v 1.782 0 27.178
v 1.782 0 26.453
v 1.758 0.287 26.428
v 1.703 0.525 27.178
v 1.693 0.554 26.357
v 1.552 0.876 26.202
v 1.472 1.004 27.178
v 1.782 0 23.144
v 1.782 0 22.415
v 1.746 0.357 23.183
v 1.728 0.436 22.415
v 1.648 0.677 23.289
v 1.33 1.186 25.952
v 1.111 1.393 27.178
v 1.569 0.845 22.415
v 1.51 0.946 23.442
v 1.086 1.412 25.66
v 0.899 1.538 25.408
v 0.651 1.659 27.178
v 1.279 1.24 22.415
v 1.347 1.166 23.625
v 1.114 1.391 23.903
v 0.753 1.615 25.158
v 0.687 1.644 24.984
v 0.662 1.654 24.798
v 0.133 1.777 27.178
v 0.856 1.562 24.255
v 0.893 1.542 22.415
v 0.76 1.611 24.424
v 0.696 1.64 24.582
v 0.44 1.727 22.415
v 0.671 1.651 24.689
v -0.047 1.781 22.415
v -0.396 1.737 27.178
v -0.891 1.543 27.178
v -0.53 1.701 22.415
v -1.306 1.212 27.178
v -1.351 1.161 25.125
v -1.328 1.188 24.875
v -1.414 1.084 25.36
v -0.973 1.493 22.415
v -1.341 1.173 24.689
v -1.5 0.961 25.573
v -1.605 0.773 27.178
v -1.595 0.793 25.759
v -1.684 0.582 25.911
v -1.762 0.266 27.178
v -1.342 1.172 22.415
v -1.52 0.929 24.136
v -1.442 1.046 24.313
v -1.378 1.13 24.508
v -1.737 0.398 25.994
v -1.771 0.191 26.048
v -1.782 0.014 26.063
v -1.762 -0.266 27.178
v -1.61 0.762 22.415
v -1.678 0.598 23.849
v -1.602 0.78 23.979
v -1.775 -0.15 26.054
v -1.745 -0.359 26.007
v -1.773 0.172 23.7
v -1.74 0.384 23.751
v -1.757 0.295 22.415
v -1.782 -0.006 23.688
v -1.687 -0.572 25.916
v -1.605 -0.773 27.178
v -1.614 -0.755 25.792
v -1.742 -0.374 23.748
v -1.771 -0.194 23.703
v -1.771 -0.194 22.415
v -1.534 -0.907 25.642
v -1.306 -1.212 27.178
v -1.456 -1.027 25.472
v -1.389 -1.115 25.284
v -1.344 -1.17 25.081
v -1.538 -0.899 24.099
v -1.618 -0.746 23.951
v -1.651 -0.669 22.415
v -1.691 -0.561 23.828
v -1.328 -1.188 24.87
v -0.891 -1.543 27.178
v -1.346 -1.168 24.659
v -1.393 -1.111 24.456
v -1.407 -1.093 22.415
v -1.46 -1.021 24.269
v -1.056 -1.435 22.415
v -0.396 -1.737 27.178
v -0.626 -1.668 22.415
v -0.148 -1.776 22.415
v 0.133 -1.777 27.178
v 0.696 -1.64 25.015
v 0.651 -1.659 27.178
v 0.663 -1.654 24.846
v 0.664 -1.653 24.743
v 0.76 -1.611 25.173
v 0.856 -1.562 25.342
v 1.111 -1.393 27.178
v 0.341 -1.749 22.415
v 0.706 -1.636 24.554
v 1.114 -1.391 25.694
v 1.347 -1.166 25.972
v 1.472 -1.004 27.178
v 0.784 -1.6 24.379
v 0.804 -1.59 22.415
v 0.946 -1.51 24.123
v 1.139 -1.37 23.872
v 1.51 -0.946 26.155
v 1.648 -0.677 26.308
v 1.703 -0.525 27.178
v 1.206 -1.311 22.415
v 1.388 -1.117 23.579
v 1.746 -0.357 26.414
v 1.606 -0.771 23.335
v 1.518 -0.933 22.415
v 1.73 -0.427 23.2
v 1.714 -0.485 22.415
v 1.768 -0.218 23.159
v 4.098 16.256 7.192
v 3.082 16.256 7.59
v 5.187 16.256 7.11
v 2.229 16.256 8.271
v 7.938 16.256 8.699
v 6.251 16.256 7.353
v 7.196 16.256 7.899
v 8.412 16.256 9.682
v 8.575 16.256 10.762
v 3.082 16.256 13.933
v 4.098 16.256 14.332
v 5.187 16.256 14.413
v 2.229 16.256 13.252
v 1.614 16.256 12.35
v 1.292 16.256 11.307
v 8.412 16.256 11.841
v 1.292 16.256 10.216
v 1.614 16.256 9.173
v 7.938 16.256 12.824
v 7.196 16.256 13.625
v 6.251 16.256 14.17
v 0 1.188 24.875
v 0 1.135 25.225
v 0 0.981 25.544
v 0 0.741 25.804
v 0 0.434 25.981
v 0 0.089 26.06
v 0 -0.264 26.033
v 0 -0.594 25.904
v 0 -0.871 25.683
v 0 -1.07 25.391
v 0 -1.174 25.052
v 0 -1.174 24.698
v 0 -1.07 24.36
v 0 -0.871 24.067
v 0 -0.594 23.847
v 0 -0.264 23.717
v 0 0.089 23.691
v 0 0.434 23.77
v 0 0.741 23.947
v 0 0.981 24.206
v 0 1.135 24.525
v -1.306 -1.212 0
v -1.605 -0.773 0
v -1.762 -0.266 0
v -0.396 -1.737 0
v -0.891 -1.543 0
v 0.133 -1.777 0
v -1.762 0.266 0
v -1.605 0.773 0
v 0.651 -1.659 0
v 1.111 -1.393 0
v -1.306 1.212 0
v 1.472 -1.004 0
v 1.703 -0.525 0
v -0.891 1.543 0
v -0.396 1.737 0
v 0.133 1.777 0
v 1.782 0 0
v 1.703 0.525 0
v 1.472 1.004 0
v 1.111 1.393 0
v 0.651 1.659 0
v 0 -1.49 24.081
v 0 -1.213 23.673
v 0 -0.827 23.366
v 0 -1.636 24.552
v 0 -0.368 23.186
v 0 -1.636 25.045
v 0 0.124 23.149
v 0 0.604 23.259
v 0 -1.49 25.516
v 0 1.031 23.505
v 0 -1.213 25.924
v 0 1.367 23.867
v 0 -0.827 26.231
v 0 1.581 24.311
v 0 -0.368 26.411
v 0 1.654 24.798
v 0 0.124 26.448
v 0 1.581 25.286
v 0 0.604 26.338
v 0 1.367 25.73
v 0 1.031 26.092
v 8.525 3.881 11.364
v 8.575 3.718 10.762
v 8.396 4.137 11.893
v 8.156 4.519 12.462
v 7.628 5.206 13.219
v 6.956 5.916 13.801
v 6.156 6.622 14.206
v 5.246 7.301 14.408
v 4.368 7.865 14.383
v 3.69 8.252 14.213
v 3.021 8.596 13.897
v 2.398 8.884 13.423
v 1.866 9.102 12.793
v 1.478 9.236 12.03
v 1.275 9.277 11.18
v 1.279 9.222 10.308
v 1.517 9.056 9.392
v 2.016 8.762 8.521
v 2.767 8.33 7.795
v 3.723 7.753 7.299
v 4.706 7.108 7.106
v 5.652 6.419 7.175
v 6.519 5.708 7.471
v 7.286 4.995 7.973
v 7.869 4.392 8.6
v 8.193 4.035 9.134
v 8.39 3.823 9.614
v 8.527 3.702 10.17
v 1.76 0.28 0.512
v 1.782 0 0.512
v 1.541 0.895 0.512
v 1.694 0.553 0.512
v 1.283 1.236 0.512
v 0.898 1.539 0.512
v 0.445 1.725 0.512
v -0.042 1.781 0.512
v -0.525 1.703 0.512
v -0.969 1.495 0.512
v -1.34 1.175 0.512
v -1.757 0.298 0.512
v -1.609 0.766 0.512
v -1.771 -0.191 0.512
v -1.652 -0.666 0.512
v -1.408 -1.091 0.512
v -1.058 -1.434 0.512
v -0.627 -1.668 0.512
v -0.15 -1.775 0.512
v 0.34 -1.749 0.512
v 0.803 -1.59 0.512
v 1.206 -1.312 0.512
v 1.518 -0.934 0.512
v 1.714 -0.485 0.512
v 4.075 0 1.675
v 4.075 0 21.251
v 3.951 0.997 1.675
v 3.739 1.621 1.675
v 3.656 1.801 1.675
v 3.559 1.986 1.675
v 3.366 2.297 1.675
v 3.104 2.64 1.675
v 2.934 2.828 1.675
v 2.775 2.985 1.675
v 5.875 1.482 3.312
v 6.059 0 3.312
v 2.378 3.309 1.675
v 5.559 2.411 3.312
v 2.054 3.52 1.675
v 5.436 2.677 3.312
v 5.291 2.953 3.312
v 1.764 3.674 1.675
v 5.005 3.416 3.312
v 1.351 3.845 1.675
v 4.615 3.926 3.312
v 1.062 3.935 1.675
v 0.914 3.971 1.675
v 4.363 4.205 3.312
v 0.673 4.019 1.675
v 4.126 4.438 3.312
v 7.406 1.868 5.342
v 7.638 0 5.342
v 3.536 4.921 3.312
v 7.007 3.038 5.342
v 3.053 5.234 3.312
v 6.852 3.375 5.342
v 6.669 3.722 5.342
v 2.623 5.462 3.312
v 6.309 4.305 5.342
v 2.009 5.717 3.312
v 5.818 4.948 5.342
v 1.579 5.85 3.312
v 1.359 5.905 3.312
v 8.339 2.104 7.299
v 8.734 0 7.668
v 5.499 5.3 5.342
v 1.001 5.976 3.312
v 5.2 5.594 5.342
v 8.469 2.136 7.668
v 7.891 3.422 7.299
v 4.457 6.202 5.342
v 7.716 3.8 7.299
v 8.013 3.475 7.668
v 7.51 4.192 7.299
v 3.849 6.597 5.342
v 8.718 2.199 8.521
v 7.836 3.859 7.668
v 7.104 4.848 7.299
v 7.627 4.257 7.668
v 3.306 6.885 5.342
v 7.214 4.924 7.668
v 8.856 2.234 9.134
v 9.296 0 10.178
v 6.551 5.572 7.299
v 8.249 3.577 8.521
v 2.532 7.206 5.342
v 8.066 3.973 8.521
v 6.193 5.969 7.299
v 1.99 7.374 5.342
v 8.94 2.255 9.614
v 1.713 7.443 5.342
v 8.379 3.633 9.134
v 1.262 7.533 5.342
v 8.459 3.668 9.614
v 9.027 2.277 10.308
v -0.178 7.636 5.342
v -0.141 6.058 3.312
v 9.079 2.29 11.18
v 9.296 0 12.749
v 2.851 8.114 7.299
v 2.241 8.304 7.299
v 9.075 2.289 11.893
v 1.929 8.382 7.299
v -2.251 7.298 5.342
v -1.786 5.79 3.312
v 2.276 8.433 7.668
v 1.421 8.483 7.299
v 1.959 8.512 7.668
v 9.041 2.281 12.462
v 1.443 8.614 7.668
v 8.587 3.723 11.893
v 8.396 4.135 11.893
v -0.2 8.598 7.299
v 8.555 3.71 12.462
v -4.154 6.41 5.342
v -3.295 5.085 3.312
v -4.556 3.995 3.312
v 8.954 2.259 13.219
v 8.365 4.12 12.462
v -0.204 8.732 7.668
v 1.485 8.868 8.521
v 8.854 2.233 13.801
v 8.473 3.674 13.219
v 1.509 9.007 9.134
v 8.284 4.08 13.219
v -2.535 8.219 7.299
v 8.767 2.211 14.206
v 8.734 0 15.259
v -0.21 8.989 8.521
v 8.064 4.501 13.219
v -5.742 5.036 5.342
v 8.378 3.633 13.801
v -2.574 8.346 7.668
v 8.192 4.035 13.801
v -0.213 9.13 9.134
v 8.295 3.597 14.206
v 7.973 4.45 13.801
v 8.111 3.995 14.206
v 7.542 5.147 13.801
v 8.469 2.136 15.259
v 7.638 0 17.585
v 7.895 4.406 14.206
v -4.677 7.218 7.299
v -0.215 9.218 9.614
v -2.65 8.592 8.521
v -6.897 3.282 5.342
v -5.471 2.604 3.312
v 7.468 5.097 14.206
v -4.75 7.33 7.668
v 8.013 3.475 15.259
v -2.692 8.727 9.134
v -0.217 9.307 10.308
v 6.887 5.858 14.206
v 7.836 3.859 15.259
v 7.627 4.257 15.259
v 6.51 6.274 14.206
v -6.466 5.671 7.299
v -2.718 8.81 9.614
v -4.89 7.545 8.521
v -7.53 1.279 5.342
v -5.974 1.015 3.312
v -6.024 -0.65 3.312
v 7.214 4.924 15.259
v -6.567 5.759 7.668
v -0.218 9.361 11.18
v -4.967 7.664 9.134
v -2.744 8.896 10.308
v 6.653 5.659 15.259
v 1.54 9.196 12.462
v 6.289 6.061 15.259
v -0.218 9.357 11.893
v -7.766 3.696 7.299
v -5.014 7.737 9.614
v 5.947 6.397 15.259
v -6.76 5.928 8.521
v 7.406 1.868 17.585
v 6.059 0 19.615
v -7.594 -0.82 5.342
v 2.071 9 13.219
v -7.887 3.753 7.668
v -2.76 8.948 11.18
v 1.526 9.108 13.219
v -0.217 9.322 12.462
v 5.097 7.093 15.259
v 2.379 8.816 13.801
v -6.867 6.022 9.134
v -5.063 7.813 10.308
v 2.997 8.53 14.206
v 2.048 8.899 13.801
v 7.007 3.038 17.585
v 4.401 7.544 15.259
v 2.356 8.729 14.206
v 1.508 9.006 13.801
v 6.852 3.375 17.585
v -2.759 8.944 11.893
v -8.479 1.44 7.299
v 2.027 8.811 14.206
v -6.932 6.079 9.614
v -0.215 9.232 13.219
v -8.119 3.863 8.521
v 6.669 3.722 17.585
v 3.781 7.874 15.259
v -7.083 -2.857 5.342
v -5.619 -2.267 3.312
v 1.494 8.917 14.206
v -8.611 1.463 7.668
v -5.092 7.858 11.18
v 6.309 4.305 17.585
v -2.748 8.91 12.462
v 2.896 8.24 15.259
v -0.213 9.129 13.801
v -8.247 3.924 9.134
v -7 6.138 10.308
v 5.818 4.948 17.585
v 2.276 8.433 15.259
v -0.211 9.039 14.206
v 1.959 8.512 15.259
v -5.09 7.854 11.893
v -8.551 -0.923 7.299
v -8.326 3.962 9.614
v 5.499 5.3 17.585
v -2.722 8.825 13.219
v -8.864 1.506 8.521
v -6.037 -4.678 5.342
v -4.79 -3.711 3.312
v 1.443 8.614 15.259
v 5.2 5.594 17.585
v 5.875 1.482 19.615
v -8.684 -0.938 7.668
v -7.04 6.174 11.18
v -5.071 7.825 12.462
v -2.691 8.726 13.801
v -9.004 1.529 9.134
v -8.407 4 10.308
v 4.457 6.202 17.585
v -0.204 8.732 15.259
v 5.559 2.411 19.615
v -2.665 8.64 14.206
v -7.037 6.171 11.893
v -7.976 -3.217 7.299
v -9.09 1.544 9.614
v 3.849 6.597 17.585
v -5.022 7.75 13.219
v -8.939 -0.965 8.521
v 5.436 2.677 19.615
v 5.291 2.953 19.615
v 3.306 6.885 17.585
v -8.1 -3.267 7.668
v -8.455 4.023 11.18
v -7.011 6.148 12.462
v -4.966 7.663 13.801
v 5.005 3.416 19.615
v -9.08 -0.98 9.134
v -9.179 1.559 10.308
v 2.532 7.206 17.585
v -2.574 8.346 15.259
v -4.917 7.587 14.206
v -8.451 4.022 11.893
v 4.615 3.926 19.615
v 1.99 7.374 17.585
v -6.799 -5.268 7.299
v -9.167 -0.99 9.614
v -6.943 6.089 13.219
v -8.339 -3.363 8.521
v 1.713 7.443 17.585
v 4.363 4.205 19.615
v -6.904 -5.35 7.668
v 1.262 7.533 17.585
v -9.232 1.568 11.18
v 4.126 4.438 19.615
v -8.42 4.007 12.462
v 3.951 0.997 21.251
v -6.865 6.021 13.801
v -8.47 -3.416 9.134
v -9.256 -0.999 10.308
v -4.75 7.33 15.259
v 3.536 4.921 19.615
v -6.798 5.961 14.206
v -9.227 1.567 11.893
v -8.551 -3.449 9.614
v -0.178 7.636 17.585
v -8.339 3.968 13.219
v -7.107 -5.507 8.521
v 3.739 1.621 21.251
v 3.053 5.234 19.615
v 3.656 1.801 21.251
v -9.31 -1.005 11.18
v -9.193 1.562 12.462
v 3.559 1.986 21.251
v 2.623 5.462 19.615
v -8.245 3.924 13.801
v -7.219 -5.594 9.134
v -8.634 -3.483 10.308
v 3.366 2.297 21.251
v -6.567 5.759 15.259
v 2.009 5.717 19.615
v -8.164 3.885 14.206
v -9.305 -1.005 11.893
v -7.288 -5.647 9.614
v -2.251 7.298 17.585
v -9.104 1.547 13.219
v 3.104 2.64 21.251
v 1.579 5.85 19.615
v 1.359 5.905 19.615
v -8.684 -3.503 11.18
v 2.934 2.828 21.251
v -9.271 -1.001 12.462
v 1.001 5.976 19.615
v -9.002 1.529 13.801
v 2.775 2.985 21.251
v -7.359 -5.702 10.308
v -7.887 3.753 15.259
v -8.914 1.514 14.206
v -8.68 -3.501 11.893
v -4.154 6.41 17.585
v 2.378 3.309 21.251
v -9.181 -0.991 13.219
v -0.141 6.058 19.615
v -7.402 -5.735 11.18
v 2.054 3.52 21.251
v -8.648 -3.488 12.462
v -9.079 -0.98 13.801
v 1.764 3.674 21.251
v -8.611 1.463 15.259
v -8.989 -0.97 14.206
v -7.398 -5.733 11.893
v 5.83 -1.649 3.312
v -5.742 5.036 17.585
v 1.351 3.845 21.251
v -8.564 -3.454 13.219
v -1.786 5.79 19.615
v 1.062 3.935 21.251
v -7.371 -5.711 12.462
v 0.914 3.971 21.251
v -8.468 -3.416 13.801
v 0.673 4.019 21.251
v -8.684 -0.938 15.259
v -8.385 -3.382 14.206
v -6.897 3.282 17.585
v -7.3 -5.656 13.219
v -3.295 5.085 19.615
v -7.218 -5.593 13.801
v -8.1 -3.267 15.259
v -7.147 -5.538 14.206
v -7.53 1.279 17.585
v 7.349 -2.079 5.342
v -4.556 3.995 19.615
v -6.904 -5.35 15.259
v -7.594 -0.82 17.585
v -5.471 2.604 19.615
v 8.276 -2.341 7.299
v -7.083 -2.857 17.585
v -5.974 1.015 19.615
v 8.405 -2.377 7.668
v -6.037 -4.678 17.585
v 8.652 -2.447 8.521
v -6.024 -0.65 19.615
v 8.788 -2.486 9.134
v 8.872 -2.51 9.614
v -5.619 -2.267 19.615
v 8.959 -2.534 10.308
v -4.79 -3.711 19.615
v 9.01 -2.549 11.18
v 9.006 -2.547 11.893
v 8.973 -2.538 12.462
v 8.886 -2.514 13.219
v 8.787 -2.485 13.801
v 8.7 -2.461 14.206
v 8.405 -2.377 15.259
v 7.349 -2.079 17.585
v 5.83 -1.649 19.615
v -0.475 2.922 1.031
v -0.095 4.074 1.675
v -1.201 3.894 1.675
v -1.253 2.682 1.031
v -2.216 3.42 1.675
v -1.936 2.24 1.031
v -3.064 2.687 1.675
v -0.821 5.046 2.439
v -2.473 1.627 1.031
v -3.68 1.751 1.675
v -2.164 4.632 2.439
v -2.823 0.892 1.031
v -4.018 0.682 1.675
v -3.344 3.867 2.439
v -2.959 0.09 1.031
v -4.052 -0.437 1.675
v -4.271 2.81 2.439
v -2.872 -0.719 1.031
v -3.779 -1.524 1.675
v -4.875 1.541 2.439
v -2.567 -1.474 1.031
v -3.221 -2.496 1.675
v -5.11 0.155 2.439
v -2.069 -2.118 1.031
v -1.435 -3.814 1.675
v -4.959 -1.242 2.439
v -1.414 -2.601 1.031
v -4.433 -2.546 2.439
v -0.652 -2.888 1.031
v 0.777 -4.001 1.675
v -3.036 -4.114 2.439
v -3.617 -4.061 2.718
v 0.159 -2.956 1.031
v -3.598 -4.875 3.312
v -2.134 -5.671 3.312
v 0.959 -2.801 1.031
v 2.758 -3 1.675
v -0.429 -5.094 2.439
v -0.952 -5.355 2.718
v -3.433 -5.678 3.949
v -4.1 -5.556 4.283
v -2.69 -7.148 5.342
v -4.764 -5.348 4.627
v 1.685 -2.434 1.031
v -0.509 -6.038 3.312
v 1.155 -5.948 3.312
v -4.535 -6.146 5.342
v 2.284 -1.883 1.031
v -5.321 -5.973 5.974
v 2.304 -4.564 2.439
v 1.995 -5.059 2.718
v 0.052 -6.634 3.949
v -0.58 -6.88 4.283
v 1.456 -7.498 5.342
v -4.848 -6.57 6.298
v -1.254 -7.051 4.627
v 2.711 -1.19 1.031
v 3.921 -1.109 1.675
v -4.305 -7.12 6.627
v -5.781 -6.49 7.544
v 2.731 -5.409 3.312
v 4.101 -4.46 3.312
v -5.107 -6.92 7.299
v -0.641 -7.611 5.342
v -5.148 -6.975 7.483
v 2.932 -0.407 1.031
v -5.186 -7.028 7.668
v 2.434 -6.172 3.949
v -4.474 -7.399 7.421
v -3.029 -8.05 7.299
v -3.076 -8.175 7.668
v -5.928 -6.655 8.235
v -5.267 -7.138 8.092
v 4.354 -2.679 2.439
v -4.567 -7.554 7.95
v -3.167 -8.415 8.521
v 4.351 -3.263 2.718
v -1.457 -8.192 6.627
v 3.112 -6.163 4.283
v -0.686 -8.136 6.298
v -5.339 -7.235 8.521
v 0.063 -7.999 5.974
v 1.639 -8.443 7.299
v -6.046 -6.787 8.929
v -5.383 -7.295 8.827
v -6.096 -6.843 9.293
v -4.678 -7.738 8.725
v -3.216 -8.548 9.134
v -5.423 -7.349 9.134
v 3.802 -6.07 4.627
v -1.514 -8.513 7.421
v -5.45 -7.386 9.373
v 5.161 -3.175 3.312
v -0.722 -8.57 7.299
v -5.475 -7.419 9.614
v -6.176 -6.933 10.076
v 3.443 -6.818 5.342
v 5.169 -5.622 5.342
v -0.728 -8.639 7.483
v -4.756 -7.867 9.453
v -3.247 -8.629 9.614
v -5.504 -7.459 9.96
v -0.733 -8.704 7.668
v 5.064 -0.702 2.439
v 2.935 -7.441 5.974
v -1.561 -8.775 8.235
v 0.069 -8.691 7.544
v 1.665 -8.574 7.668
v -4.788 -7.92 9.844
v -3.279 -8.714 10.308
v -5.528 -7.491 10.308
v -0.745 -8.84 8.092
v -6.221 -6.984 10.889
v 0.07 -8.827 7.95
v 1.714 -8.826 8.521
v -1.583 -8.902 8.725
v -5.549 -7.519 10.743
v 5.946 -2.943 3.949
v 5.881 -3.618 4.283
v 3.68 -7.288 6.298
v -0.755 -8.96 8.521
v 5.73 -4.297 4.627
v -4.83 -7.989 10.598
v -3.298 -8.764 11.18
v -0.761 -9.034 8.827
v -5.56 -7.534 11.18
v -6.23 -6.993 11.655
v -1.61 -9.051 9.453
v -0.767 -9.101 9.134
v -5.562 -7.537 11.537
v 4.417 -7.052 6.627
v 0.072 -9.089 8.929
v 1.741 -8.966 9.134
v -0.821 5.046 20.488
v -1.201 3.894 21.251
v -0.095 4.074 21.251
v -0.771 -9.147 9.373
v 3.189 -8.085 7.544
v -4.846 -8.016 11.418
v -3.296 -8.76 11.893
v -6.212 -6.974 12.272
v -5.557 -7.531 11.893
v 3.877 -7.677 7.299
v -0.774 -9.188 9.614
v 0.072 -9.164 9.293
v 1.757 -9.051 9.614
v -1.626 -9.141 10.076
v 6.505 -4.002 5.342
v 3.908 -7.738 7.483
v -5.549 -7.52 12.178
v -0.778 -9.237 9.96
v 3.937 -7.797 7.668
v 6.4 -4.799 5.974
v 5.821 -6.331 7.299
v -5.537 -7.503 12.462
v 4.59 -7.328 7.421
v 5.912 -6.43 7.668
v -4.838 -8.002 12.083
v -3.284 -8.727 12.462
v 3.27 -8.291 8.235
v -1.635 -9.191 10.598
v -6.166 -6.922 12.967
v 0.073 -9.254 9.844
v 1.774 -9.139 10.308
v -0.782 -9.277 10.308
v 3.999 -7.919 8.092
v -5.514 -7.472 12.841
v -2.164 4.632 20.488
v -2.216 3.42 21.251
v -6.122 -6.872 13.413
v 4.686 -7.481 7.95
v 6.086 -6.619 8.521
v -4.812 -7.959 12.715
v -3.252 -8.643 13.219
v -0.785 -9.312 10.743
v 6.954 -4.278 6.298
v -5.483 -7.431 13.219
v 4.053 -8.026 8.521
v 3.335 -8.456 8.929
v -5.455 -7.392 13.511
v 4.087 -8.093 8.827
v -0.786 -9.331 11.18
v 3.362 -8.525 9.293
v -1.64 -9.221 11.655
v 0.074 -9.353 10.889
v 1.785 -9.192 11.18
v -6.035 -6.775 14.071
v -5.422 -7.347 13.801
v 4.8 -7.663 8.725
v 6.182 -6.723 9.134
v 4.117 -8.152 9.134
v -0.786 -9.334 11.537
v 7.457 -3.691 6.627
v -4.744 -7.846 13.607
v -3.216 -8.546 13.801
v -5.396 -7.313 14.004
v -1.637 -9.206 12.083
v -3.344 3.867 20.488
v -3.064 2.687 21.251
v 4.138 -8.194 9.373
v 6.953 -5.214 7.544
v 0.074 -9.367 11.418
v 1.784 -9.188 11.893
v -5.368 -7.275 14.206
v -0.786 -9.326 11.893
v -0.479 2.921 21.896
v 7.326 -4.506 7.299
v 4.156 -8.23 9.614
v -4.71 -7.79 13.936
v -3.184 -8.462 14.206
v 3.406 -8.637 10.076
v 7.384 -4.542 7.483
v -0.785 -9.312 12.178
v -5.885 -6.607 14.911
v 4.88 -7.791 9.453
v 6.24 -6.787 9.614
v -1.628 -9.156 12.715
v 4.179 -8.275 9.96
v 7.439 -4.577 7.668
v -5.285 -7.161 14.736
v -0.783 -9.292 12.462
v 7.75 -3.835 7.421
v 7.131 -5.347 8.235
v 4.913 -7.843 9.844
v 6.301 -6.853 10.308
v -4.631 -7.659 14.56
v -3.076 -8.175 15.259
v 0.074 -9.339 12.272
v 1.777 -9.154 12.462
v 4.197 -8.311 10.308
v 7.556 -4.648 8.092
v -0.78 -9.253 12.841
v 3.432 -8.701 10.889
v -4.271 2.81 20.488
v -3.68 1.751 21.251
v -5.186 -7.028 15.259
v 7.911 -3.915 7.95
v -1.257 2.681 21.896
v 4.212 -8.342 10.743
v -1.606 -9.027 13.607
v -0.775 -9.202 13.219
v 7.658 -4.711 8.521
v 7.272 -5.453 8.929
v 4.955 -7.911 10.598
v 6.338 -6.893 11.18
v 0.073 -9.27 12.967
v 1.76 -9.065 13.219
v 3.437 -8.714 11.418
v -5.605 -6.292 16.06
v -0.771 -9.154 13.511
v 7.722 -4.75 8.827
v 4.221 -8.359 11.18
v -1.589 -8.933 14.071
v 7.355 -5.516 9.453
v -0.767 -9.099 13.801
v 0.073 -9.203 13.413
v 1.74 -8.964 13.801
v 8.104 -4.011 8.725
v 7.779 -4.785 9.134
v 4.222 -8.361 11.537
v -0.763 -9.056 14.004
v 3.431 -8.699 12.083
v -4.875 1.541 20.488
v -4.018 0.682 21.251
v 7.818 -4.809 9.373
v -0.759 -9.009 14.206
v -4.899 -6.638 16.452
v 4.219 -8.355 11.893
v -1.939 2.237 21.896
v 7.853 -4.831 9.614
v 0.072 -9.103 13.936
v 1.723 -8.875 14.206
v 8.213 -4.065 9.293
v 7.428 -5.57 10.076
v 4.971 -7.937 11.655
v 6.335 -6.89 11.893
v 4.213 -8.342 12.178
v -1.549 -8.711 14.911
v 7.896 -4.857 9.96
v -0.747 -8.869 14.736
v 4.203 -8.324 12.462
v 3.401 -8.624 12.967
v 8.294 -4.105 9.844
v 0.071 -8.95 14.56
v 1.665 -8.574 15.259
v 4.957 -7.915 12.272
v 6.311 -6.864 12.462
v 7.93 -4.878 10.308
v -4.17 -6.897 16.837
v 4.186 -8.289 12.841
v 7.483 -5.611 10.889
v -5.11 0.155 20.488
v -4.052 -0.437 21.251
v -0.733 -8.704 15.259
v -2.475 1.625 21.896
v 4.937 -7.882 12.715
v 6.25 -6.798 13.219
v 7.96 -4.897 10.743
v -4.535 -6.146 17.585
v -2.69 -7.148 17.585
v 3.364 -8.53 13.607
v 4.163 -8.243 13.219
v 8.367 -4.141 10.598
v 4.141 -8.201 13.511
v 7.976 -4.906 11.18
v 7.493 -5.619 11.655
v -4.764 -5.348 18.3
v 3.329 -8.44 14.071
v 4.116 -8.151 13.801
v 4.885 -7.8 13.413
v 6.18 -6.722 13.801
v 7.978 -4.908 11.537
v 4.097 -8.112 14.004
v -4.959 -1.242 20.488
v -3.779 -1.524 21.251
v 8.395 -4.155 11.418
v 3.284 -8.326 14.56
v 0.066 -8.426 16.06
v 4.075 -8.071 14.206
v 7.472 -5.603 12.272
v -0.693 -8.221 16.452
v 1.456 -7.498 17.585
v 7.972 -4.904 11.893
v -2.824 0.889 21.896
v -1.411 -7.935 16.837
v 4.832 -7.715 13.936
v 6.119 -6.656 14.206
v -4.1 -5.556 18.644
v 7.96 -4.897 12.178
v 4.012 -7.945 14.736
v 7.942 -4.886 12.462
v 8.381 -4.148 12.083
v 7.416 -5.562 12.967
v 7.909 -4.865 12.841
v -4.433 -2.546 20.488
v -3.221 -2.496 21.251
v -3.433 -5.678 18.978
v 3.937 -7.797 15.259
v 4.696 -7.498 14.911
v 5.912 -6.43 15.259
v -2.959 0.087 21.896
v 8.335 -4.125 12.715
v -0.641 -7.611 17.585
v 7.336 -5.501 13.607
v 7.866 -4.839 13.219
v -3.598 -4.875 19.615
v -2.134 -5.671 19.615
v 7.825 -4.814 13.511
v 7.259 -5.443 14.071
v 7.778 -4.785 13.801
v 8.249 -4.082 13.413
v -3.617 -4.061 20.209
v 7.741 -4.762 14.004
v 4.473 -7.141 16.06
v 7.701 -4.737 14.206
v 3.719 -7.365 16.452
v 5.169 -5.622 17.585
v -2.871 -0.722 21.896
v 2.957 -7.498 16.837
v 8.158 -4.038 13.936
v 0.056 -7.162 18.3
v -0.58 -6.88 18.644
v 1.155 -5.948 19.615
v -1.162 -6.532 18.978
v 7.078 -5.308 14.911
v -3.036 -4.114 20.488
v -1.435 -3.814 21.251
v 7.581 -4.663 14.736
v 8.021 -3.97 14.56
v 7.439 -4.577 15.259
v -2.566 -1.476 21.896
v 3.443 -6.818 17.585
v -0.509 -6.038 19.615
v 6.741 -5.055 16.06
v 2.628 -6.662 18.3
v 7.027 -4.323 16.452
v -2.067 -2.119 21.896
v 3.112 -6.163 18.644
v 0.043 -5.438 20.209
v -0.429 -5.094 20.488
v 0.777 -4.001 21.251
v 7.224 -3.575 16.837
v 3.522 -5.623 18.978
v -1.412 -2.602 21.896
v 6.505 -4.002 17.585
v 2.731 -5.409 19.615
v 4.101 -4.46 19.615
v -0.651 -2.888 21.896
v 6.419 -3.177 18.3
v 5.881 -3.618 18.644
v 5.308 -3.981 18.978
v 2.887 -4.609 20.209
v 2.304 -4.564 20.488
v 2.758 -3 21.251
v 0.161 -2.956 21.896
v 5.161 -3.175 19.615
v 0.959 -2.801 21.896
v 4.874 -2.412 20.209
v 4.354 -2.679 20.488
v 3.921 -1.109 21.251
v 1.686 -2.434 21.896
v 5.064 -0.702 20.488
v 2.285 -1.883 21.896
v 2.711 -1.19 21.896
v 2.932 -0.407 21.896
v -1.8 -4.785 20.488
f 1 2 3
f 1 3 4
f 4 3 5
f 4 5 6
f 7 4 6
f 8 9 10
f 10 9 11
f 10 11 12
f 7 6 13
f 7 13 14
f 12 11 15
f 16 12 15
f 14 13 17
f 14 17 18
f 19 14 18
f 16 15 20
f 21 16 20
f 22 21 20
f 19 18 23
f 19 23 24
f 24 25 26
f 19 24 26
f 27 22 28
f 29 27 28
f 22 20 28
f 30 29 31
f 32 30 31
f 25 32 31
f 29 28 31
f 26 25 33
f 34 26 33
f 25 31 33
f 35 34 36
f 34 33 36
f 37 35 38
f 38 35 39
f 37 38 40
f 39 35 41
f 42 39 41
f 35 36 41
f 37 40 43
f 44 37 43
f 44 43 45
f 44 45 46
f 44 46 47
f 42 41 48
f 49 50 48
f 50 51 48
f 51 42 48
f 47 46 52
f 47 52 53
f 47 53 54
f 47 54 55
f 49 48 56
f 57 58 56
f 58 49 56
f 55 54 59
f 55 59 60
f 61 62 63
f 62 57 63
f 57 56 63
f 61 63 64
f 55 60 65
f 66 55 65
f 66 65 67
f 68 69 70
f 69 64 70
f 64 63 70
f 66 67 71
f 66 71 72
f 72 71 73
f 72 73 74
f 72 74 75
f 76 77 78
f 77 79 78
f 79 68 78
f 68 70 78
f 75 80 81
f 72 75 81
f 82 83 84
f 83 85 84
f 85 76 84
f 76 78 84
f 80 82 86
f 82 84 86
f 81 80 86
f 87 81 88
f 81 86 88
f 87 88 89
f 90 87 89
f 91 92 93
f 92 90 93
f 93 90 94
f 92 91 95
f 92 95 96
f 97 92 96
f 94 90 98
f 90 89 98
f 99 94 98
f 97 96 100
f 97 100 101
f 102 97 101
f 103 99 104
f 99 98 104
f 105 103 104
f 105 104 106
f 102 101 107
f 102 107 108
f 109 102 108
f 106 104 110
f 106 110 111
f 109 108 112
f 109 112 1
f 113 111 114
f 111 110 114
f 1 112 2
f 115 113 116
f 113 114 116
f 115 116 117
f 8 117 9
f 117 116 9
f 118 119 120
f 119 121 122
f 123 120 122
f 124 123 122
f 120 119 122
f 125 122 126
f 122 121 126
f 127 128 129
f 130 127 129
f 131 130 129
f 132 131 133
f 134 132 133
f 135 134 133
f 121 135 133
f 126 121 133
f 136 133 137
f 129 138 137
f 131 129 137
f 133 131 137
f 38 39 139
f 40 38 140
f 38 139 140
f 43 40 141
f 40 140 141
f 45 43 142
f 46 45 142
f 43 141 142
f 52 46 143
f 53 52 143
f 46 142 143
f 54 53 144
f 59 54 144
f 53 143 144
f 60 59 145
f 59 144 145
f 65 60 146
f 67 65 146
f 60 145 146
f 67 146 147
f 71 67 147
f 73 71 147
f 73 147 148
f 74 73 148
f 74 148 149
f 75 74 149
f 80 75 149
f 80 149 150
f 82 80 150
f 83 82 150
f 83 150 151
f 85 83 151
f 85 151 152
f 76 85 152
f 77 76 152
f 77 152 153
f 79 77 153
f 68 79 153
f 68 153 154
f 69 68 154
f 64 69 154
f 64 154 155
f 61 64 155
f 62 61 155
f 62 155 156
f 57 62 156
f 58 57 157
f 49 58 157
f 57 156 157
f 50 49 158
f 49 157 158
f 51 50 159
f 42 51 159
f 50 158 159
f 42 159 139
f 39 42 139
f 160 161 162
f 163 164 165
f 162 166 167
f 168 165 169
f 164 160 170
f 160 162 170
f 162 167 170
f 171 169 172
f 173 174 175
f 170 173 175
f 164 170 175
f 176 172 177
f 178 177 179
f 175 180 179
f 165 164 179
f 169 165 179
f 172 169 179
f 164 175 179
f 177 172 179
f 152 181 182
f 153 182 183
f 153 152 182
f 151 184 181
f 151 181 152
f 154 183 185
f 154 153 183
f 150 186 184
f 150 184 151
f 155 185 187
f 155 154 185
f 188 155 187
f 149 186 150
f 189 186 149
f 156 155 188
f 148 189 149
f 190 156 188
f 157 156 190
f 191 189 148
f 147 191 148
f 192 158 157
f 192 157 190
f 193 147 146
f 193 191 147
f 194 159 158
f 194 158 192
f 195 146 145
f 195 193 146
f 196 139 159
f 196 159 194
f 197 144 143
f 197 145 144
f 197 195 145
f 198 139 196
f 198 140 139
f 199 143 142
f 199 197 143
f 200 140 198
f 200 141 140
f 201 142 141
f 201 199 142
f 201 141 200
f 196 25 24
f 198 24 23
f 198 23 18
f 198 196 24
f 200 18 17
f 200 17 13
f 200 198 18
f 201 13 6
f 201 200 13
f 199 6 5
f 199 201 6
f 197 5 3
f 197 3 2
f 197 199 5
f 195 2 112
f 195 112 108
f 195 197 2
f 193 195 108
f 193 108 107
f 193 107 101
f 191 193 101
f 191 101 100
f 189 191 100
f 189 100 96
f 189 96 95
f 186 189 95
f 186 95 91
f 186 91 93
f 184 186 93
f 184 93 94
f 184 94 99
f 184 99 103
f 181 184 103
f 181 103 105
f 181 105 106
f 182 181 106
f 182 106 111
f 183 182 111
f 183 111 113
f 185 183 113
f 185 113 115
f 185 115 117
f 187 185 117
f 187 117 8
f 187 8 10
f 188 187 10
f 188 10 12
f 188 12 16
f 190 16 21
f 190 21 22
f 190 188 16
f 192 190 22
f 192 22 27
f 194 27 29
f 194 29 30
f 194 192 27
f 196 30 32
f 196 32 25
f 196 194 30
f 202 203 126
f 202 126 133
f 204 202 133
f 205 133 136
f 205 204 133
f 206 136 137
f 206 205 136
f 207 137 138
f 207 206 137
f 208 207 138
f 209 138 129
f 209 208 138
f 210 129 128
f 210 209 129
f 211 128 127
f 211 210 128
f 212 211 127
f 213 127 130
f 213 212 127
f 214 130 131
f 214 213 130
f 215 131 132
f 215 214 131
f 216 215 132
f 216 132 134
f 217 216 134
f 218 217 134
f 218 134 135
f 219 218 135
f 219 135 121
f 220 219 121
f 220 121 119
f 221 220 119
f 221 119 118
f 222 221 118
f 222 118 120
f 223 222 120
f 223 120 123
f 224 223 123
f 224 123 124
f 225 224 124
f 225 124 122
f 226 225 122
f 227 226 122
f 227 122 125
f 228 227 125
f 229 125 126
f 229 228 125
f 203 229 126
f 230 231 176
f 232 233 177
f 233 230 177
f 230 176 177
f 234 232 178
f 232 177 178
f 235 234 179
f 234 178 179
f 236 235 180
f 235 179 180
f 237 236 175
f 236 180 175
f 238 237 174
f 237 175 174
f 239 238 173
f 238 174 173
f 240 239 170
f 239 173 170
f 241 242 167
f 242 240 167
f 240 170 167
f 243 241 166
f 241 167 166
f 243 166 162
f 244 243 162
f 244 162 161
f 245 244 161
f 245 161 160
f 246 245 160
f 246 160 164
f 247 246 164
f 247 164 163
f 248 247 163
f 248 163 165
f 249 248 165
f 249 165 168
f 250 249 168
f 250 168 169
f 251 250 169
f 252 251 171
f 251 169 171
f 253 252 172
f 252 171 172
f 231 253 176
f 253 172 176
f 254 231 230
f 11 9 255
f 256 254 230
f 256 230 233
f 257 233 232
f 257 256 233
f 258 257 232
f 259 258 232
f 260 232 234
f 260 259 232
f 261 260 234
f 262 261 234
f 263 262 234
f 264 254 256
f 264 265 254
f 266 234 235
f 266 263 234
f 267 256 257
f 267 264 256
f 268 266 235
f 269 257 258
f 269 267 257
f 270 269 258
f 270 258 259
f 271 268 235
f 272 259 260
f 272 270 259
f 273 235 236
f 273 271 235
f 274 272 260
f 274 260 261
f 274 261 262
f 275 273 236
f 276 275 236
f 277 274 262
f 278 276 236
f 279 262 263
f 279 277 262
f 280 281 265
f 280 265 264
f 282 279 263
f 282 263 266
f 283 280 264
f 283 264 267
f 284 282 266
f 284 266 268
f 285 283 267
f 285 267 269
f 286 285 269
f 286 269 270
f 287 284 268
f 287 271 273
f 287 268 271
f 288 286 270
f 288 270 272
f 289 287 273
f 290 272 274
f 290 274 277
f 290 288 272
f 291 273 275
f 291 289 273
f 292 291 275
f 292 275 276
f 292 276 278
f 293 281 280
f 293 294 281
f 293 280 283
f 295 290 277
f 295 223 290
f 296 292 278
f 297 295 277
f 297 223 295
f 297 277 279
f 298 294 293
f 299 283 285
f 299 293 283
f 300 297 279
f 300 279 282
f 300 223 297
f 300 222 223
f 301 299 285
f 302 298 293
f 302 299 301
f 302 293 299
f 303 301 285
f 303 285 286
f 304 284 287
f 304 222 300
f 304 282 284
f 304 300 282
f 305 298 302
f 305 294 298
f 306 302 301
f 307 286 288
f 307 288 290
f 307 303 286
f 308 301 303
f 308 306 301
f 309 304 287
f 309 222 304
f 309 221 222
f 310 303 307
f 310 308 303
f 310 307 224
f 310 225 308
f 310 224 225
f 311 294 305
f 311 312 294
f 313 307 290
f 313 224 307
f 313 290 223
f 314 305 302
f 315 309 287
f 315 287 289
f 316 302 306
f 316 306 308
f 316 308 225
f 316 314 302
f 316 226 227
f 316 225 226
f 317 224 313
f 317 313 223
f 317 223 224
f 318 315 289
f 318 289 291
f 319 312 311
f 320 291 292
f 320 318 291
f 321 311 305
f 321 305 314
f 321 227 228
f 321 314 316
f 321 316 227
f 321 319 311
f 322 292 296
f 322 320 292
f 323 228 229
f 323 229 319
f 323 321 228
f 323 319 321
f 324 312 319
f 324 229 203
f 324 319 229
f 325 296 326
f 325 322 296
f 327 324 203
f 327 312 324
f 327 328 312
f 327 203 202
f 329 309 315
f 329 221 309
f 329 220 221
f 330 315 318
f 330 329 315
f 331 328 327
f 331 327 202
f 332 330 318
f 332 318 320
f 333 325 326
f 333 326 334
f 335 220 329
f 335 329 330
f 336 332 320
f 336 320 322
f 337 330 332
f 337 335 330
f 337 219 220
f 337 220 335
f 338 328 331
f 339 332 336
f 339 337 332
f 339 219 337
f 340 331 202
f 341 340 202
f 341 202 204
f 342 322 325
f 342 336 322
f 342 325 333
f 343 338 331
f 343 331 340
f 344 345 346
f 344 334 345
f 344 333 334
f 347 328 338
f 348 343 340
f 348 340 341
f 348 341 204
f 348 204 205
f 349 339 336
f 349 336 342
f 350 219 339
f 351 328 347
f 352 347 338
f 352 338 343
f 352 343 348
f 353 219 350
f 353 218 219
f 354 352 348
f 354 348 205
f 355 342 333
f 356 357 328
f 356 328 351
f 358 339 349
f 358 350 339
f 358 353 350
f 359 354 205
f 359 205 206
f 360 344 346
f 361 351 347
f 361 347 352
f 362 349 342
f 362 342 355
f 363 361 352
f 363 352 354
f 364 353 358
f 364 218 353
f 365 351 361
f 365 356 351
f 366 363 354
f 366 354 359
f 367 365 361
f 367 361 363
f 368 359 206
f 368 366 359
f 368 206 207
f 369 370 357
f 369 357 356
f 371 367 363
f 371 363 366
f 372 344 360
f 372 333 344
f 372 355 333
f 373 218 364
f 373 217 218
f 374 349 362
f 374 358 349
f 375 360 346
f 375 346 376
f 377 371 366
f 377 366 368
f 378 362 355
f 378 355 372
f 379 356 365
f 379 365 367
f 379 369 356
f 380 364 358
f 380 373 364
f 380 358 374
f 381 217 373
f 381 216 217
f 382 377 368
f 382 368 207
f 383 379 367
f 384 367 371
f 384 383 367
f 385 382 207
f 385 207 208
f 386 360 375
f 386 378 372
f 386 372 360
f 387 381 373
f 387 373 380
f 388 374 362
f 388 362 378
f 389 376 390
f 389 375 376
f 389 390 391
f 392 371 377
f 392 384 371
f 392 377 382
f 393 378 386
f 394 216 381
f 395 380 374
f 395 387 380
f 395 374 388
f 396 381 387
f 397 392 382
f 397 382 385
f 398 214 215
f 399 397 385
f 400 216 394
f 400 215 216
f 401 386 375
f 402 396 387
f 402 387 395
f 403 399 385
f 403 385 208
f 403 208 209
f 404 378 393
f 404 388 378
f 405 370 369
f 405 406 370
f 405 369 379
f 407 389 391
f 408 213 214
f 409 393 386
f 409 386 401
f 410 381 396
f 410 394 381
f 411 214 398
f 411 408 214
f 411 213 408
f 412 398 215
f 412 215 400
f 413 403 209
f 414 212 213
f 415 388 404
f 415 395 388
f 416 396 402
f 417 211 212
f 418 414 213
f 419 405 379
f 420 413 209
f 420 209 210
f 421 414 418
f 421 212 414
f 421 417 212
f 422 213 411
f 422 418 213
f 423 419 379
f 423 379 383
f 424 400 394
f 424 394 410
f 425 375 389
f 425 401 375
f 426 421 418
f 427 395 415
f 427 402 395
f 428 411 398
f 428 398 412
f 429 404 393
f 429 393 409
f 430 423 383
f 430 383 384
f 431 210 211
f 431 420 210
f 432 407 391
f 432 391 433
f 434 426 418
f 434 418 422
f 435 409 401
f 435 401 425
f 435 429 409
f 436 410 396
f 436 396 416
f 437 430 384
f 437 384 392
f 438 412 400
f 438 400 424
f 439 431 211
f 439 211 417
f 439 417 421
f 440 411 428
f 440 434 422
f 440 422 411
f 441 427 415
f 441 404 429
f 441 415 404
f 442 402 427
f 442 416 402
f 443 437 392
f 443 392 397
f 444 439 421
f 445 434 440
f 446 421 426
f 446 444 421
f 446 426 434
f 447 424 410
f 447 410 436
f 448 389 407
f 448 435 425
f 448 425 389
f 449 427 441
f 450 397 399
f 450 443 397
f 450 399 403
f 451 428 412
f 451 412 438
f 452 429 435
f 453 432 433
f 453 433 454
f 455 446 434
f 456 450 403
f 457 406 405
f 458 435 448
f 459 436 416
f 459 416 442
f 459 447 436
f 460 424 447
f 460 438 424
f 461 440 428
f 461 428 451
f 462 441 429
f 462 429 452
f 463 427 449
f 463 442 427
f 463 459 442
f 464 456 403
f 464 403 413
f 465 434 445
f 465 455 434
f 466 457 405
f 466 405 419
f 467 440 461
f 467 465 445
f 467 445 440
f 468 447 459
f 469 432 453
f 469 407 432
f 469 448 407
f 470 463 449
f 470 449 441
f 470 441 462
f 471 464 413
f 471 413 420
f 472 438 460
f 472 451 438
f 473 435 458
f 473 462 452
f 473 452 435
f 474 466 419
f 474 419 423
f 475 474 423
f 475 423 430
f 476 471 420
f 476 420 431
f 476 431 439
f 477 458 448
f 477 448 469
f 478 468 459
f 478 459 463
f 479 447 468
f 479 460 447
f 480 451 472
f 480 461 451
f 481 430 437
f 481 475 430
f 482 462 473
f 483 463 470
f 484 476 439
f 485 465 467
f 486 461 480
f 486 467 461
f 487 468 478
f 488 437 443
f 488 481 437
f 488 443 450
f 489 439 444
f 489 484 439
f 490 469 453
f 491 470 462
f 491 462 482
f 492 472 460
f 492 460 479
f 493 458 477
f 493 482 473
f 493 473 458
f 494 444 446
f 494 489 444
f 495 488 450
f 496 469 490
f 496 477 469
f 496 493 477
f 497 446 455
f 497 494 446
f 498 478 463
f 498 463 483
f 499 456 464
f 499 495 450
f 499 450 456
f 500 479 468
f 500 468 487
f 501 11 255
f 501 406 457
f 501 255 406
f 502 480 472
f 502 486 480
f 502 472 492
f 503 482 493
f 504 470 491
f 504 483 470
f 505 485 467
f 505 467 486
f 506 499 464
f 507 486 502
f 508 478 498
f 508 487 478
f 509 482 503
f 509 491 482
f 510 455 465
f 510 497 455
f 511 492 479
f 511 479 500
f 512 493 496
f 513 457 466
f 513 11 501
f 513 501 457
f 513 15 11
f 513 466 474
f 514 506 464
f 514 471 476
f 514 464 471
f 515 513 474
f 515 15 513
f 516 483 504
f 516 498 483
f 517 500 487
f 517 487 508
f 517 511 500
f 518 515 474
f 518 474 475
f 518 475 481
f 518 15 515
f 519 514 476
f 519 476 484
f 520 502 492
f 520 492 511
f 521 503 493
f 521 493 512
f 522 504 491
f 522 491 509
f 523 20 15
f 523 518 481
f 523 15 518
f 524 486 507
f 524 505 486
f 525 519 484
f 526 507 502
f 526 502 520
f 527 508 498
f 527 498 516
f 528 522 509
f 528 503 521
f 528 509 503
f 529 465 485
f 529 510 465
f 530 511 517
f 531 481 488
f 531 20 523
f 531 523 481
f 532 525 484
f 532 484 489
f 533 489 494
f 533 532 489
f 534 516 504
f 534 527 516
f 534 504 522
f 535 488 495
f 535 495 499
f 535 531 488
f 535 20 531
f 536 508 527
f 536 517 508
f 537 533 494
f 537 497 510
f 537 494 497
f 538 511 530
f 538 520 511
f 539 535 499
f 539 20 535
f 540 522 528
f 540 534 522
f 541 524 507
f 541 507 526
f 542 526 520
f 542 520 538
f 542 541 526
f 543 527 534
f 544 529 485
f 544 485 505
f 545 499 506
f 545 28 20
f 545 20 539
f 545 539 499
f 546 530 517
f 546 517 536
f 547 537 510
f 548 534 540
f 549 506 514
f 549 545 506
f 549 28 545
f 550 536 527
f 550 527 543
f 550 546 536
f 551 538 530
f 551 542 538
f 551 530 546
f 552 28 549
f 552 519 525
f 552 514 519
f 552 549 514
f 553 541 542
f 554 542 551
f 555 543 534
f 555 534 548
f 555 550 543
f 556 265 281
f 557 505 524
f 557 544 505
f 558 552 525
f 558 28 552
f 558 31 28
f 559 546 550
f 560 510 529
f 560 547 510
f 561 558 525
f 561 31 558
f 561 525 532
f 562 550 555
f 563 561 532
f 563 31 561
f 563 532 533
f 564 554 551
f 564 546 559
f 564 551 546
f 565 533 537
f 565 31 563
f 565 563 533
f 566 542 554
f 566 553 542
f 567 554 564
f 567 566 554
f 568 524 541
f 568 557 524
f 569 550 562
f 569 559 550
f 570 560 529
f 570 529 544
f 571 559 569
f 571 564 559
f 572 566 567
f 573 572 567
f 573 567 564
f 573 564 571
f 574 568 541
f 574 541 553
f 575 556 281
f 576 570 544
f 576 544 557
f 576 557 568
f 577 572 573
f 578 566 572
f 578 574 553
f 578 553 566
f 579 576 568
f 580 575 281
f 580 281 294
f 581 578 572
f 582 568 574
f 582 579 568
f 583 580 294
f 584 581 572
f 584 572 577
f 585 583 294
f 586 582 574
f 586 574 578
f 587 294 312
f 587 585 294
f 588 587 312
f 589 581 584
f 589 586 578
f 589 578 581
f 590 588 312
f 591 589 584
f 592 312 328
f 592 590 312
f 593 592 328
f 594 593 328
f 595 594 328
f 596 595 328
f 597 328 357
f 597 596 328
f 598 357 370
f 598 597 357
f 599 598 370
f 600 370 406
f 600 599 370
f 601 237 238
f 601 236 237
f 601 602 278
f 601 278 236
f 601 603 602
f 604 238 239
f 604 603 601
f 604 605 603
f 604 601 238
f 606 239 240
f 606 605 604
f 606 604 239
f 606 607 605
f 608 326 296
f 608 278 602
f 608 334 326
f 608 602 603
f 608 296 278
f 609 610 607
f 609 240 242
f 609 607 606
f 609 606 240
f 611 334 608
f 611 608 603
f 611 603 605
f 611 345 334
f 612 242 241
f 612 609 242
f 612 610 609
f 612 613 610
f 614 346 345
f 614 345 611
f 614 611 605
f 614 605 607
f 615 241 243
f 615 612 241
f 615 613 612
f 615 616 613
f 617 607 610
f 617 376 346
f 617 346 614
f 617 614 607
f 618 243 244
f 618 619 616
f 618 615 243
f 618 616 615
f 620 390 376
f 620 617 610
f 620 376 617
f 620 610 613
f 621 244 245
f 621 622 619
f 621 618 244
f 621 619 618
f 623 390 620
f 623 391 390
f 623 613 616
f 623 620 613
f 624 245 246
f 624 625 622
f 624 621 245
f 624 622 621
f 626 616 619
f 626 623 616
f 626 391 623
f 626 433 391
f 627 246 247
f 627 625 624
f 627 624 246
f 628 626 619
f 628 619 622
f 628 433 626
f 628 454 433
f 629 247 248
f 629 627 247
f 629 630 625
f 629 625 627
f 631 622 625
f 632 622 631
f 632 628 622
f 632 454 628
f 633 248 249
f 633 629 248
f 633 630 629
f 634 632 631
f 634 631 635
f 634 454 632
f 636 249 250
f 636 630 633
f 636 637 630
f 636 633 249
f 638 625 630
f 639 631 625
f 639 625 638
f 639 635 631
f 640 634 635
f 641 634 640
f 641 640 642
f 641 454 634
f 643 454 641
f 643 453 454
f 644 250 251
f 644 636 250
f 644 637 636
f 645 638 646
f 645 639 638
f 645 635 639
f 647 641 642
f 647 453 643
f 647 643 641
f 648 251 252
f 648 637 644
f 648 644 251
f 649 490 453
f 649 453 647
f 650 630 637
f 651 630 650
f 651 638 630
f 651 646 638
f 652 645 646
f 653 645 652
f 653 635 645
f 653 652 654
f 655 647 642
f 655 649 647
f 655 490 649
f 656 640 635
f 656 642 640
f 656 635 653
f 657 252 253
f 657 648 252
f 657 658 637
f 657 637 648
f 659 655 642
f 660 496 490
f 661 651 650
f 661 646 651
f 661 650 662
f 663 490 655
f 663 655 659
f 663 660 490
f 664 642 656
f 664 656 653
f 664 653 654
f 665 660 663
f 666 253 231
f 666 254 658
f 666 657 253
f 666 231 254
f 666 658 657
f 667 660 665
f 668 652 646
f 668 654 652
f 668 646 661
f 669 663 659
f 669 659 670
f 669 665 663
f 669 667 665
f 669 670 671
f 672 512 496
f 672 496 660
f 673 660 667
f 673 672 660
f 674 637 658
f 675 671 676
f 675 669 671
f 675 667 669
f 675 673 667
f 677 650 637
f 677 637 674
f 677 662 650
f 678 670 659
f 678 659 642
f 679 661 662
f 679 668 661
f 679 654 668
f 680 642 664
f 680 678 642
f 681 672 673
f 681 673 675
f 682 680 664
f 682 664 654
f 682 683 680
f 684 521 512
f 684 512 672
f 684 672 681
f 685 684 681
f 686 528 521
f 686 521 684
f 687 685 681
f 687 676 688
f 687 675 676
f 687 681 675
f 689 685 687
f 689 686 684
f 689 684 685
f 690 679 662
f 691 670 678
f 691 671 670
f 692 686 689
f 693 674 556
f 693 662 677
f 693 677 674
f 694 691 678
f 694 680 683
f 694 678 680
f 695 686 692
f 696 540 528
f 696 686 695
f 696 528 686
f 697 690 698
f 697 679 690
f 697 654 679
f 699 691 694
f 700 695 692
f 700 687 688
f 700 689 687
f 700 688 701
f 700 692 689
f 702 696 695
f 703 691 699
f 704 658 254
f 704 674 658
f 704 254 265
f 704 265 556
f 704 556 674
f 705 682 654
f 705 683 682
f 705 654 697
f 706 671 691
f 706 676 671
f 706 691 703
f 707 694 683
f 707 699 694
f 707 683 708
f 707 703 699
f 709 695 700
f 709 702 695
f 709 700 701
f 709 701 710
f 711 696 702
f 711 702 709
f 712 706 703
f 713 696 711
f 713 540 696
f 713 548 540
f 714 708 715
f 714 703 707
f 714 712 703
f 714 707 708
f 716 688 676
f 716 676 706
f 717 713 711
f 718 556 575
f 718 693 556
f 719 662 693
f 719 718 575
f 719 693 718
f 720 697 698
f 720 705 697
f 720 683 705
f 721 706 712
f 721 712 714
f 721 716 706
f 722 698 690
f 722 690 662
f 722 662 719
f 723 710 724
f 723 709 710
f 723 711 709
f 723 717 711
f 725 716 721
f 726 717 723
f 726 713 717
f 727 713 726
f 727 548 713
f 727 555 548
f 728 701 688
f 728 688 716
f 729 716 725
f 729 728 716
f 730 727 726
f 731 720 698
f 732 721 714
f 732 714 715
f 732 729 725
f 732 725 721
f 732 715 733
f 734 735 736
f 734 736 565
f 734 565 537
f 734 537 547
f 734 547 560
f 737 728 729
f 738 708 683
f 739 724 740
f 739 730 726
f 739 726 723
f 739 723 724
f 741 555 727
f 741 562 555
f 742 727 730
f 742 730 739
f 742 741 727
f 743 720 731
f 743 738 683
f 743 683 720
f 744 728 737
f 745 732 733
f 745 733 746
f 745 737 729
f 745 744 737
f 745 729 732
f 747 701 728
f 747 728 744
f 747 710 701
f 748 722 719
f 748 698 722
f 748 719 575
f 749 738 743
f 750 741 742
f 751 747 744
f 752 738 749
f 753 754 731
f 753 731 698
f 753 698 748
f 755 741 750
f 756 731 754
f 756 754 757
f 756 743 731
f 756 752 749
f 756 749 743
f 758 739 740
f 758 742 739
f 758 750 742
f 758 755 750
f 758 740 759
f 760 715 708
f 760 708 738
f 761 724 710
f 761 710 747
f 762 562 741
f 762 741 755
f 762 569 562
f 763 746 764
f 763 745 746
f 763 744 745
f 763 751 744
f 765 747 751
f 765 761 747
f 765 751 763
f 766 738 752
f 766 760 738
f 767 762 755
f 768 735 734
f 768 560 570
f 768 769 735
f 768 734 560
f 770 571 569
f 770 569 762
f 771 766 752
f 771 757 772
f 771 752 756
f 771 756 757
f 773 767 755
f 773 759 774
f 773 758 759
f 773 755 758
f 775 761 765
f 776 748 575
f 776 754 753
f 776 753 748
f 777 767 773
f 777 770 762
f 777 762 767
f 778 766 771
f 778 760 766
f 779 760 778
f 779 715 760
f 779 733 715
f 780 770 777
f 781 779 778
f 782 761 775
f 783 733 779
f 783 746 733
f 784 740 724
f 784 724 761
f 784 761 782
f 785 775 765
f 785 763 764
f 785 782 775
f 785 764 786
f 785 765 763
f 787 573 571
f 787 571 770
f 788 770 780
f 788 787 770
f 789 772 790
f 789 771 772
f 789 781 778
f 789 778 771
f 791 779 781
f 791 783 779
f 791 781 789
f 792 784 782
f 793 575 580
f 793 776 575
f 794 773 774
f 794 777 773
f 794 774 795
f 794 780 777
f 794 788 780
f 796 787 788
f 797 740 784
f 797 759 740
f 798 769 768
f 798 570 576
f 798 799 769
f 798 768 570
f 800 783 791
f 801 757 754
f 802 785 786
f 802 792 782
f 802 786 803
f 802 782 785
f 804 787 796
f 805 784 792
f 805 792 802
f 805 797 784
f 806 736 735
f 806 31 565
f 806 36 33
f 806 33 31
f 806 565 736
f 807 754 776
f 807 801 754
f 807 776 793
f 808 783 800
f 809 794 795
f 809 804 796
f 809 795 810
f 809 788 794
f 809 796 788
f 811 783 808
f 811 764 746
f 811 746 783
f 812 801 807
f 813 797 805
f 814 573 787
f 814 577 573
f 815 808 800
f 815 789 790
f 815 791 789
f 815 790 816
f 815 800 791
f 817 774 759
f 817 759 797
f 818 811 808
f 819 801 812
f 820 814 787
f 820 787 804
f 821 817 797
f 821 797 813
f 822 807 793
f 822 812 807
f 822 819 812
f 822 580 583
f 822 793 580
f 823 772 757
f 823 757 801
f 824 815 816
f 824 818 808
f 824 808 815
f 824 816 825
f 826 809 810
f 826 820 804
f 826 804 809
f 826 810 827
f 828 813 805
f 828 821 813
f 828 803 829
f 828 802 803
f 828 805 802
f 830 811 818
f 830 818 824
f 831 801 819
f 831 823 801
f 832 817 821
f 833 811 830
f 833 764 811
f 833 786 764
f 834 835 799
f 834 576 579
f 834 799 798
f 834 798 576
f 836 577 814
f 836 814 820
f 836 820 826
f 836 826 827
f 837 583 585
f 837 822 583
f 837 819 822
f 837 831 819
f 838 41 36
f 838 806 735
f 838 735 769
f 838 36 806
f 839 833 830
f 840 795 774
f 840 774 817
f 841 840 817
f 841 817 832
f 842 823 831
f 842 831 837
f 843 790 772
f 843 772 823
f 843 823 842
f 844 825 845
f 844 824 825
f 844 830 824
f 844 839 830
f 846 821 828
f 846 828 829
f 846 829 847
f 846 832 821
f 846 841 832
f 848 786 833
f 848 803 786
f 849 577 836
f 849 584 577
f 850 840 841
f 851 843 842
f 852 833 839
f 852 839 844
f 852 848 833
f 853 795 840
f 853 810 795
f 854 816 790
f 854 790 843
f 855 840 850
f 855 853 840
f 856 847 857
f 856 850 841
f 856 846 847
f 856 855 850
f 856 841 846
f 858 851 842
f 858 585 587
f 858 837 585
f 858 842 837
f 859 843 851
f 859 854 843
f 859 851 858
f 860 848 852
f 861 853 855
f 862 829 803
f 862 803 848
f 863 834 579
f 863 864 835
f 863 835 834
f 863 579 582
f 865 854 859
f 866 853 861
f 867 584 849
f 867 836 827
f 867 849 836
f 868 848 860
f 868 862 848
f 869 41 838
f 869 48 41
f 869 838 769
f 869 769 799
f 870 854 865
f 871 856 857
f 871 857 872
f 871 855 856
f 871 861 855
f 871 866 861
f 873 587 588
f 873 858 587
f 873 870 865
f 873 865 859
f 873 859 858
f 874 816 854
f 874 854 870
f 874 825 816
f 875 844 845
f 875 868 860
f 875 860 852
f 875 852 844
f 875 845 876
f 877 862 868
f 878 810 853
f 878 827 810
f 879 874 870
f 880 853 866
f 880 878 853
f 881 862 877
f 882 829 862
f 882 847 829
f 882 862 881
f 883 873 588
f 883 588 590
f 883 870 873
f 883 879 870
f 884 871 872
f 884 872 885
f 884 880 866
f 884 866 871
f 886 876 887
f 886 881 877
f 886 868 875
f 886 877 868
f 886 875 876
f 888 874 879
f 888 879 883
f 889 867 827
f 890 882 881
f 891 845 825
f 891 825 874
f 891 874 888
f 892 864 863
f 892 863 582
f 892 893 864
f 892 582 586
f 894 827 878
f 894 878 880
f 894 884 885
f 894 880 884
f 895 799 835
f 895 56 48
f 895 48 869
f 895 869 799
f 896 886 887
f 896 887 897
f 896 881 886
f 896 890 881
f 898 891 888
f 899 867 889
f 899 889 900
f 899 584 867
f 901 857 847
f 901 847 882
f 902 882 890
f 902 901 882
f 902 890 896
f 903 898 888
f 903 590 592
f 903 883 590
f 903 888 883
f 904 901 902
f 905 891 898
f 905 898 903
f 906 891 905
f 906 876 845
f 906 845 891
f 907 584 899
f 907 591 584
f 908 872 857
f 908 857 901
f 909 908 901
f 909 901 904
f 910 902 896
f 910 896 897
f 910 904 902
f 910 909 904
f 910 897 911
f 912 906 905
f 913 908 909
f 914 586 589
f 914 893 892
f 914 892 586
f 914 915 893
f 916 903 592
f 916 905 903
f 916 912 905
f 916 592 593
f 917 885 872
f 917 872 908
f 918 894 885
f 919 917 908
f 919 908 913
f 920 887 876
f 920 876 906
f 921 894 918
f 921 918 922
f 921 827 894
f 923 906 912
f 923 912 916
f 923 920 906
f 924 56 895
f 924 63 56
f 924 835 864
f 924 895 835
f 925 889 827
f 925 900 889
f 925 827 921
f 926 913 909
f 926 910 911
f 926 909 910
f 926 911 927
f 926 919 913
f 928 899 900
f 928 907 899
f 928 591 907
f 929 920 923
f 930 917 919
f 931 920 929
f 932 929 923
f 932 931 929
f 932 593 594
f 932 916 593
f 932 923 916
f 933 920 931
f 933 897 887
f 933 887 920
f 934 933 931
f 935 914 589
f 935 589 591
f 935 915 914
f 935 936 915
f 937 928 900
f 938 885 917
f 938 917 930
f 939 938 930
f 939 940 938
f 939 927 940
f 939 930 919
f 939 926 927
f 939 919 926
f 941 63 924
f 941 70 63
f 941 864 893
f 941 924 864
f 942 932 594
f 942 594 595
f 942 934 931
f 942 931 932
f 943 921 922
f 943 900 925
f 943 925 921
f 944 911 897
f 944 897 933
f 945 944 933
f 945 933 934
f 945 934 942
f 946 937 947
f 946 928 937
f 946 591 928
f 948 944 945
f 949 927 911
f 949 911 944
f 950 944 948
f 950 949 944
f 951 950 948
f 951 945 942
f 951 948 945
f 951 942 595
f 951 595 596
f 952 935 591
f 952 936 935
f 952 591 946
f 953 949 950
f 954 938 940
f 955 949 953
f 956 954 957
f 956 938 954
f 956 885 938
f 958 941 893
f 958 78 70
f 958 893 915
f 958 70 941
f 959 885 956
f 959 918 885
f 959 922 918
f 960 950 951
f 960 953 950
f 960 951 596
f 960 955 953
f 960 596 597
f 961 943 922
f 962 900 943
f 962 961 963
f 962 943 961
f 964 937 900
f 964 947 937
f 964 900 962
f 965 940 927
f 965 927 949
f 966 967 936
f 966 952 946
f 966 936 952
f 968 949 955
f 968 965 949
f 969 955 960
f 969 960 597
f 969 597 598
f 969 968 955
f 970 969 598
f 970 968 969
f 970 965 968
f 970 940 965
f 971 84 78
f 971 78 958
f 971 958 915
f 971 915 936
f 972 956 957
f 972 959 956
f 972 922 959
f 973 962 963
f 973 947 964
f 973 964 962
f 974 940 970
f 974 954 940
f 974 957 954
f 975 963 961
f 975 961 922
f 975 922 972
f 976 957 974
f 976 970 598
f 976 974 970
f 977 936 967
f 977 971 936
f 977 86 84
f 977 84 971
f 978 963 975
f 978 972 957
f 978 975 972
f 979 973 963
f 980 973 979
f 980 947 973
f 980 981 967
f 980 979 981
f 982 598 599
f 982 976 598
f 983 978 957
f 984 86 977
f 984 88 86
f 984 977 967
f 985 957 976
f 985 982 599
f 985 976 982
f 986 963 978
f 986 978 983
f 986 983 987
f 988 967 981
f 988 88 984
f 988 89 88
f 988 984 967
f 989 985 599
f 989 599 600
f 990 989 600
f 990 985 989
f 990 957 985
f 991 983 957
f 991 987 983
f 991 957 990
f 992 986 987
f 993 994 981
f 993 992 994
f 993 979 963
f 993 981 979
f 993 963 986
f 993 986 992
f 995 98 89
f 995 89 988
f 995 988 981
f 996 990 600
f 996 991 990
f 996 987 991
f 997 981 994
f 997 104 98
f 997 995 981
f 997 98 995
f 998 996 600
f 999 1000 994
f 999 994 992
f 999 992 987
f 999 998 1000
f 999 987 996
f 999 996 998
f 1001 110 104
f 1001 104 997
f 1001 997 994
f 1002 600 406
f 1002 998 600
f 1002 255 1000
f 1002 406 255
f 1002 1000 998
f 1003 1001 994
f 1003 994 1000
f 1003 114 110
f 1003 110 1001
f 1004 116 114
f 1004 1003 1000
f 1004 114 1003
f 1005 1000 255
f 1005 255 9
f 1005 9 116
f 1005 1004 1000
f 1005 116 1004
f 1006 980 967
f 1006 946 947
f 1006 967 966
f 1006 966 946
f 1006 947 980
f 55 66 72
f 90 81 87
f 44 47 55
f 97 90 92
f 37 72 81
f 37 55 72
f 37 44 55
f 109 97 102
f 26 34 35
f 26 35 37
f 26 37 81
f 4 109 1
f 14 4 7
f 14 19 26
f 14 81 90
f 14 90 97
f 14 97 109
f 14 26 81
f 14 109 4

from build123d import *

# Parameters (mm, degrees)
F4_R      = 3.6618559104
F5_DEPTH  = 16.256
F6_R      = 1.7816904606
F7_DEPTH  = 27.178
F8_R      = 1.1877343137
F9_DEPTH  = 72.136
F10_R     = 1.6542577125
F11_DEPTH = 132.588


# Not quite as in the source:
# - the program builds the solid bodies; features that only make, move or delete a surface that nothing else refers to are left out


with BuildPart() as f1:
    # F0 (on Front) → F1 (revolve)
    with BuildSketch(Plane.XZ):
        with BuildLine():
            Line((0, 22.9268427938), (0, 0))
            ThreePointArc((0, 0), (9.3672569036, 11.4634213969), (0, 22.9268427938))
        make_face()
    revolve(axis=Axis((0, 0, 11.4634213969), (0, 0, 1)))

    # F4 (on Front) → F5 (join)
    with BuildSketch(Plane.XZ):
        with Locations((4.9128951505, 10.7615785673)):
            Circle(F4_R)
    extrude(amount=-F5_DEPTH)

    # F6 (on Top) → F7 (join)
    with BuildSketch(Plane.XY):
        Circle(F6_R)
    extrude(amount=F7_DEPTH)

    # F8 (on Right) → F9 (cut)
    with BuildSketch(Plane.YZ):
        with Locations((0, 24.8752553016)):
            Circle(F8_R)
    extrude(amount=-F9_DEPTH, mode=Mode.SUBTRACT)

    # F10 (on Right) → F11 (cut)
    with BuildSketch(Plane.YZ):
        with Locations((0, 24.7984230518)):
            Circle(F10_R)
    extrude(amount=F11_DEPTH, mode=Mode.SUBTRACT)


solid = f1.part
